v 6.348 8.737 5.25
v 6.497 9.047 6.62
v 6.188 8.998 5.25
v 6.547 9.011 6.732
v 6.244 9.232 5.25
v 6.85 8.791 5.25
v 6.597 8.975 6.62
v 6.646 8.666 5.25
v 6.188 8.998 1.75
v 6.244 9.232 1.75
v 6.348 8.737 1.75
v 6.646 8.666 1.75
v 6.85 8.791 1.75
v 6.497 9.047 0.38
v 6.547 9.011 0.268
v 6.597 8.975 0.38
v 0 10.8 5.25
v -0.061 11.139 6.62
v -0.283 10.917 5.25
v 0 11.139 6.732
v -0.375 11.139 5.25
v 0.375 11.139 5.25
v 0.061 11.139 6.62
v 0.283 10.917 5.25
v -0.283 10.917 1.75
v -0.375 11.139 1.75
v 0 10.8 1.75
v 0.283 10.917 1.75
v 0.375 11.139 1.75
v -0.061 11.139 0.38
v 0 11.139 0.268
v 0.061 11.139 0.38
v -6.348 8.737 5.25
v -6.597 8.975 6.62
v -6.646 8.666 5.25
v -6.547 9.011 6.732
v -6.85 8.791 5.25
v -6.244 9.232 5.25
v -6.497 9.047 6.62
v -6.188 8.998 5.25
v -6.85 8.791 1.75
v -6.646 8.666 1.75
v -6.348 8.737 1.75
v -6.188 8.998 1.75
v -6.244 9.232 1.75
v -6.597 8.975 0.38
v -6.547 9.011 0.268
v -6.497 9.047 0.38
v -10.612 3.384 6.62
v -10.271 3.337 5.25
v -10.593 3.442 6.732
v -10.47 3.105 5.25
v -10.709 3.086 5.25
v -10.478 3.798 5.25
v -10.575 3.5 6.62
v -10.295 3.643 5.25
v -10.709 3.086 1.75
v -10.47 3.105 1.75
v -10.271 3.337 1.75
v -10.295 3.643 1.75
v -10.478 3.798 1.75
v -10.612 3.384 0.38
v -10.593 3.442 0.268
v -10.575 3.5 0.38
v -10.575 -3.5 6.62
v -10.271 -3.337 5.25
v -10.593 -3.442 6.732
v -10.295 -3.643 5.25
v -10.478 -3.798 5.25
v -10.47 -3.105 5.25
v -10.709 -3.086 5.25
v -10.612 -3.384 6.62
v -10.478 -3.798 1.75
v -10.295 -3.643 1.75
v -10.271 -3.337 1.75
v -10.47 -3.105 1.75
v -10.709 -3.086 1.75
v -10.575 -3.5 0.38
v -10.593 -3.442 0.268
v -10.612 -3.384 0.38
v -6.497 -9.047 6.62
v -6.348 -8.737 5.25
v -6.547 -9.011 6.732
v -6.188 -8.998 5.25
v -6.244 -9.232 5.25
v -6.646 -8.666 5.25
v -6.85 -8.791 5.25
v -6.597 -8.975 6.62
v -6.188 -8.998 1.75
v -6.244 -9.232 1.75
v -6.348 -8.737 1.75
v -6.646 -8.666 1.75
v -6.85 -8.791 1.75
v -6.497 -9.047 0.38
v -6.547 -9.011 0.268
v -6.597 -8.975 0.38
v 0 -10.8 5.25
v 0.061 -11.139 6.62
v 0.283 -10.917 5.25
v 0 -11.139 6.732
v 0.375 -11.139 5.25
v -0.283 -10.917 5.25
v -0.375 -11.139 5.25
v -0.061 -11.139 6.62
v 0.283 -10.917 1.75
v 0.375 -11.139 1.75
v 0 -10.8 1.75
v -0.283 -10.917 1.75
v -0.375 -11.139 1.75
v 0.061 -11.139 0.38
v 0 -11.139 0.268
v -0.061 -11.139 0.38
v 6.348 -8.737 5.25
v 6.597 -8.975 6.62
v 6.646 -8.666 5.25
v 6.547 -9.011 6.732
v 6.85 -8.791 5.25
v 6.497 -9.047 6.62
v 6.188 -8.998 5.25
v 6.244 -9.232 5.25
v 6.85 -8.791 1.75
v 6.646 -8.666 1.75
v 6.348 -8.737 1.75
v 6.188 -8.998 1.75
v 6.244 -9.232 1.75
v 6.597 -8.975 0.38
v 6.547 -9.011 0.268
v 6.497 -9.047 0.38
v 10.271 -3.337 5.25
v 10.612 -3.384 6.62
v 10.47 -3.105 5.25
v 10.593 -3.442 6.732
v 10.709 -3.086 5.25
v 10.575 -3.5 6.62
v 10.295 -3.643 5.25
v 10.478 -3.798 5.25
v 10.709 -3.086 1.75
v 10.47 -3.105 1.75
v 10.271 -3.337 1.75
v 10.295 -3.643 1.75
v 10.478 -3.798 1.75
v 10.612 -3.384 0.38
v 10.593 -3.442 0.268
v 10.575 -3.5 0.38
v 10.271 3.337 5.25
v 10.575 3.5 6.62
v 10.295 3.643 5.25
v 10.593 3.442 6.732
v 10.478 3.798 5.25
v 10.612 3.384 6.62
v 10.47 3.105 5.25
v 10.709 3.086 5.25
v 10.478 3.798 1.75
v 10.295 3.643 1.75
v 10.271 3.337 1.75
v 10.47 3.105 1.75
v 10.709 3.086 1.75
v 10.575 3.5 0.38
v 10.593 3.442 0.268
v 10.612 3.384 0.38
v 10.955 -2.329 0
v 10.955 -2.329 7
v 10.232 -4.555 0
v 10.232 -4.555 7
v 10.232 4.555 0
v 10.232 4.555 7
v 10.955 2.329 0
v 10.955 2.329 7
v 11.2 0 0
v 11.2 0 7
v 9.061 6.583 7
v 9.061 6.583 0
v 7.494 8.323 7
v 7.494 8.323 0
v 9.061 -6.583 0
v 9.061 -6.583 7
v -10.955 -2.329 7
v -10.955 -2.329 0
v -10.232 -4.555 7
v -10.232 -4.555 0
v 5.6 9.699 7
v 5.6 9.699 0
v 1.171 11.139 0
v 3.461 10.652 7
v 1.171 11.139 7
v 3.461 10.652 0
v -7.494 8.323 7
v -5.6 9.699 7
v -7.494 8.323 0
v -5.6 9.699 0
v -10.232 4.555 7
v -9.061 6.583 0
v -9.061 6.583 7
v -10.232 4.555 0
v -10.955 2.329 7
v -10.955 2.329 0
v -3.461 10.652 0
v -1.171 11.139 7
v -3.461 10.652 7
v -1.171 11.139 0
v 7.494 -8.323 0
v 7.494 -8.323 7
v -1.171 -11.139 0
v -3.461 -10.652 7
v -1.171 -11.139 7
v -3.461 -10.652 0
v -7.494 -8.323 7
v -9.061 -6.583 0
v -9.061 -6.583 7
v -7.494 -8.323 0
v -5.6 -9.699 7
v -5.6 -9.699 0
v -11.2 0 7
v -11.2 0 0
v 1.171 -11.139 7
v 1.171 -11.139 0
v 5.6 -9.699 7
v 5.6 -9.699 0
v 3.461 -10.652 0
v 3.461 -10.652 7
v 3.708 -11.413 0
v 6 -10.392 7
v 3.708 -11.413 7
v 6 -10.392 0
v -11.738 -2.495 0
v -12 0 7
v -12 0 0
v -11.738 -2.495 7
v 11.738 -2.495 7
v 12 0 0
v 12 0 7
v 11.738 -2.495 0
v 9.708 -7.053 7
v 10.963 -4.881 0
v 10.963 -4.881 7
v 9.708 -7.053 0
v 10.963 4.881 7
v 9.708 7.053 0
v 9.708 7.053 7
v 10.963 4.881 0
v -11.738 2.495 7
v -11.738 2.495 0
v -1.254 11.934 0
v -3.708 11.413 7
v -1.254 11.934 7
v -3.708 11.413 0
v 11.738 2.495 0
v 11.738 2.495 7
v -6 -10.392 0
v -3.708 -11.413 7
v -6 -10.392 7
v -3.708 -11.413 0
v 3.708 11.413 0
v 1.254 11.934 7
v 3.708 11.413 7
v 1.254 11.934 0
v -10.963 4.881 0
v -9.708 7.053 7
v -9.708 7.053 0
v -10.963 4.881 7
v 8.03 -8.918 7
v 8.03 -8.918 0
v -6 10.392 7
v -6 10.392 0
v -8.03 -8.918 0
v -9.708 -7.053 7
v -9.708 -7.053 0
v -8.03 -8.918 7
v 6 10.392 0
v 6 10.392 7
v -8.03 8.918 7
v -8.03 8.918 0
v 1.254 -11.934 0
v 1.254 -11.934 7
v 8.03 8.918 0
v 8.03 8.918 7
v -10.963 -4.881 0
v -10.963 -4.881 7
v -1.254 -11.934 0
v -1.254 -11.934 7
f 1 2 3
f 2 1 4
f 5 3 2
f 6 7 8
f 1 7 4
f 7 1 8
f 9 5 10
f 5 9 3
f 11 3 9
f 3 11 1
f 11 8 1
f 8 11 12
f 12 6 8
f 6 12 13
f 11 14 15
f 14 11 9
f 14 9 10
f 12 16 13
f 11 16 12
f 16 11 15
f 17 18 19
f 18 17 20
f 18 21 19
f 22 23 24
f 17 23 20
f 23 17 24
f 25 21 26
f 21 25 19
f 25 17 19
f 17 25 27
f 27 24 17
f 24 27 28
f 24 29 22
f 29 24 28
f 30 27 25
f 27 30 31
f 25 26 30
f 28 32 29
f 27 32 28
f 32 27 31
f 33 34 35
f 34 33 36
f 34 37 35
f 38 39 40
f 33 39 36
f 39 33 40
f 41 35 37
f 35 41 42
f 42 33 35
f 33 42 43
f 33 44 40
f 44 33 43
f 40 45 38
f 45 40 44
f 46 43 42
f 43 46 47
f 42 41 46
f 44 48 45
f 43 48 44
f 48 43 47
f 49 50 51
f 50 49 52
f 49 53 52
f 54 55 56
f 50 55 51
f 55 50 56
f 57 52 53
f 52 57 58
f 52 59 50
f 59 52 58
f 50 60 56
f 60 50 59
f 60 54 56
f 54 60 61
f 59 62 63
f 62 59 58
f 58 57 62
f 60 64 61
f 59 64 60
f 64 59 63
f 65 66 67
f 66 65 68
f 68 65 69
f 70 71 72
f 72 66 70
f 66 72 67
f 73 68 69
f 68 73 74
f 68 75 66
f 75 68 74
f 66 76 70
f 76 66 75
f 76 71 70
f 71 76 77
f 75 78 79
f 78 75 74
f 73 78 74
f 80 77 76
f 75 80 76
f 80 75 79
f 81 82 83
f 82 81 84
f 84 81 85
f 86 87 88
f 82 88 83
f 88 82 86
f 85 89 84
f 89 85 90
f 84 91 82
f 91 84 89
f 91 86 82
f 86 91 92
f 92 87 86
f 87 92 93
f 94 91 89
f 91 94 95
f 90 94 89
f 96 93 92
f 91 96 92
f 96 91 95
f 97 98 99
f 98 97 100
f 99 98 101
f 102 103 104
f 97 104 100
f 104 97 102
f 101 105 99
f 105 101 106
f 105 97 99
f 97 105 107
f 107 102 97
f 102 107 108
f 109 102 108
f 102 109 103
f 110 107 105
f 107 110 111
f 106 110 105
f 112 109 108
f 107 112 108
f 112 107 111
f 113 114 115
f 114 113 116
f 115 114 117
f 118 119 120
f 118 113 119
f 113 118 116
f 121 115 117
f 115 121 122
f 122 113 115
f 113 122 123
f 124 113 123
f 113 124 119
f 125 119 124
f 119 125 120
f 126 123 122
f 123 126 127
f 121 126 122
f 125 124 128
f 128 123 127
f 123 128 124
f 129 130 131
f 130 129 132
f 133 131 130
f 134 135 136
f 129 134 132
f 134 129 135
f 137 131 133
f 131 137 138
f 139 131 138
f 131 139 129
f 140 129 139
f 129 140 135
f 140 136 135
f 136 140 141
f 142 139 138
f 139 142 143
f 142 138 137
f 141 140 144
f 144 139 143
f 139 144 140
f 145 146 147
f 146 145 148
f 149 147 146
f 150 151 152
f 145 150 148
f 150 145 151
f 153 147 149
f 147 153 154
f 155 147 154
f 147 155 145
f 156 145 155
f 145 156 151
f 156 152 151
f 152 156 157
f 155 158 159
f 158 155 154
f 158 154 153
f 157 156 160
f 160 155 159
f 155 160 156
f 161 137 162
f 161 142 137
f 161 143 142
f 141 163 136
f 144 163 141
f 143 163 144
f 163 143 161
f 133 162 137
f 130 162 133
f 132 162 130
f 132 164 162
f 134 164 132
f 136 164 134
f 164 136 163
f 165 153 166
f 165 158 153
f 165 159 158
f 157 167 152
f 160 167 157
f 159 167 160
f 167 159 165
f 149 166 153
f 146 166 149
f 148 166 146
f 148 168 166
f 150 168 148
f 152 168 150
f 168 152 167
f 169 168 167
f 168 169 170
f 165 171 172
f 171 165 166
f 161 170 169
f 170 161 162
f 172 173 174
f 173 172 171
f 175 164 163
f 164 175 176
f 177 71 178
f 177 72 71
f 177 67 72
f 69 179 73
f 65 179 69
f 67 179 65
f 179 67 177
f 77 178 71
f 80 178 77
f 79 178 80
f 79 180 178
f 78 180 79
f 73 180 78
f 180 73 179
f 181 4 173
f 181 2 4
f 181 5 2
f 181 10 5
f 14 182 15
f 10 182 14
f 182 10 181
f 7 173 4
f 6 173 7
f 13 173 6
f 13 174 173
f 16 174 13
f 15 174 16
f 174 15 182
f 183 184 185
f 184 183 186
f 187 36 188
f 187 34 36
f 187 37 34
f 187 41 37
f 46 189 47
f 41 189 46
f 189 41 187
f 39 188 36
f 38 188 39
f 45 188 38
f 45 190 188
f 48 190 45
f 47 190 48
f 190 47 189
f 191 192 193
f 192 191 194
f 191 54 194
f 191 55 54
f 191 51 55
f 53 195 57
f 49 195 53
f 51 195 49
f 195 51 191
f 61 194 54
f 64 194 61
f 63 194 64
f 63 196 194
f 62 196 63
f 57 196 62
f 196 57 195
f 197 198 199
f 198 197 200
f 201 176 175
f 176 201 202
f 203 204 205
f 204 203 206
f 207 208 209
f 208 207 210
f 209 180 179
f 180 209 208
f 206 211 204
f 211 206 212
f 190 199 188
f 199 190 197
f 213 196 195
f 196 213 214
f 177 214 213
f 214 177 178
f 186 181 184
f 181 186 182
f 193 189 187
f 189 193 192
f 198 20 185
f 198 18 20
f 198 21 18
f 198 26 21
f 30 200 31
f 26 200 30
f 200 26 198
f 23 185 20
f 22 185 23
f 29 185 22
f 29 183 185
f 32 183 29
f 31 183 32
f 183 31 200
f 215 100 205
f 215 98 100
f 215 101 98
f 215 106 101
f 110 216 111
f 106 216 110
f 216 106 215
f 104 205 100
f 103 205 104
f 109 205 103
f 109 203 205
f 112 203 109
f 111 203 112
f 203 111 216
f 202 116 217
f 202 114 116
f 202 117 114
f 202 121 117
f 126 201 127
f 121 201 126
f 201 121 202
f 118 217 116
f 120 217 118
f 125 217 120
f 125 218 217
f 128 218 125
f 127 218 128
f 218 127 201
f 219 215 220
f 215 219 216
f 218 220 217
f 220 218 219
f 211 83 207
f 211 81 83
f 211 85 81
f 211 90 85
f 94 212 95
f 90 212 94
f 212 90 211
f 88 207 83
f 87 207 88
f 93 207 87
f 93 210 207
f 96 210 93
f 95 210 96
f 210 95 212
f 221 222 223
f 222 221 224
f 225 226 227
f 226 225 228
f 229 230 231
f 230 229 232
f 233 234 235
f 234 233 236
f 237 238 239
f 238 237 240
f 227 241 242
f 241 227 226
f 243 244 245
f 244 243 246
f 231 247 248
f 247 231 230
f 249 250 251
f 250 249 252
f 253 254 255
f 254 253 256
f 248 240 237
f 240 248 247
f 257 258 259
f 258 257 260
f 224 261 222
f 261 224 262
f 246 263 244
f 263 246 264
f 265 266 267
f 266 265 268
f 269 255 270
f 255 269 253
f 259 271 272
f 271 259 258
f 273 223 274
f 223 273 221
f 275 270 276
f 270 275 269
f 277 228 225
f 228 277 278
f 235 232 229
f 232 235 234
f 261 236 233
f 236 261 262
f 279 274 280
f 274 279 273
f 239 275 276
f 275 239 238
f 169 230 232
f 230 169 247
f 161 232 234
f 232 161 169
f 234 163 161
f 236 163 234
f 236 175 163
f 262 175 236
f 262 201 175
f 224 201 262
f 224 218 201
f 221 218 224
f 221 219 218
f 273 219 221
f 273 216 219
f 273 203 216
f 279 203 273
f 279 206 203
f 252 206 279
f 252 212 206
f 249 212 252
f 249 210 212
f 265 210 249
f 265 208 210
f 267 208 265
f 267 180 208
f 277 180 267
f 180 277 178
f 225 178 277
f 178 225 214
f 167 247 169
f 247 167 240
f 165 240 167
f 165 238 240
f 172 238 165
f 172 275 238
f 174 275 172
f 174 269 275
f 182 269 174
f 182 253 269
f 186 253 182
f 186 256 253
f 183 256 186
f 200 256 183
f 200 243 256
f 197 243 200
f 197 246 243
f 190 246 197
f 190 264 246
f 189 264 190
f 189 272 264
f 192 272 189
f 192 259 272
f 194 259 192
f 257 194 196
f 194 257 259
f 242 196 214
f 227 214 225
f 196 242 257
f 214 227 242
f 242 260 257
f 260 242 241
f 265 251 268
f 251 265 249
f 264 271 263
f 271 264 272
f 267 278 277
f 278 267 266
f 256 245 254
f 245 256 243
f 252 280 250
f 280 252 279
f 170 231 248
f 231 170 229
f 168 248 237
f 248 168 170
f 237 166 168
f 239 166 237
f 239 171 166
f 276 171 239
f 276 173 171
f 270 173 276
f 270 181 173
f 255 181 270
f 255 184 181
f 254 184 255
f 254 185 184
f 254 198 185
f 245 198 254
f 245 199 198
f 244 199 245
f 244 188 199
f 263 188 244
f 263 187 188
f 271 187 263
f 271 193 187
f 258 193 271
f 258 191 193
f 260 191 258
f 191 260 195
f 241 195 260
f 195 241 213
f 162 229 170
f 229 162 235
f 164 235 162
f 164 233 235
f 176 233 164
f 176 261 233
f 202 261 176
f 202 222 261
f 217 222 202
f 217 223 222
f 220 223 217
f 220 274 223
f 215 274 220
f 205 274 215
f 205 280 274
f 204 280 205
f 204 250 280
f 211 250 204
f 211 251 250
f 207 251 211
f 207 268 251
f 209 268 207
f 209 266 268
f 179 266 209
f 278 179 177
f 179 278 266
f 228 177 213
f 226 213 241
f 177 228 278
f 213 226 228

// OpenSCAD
// file: bearing_race_spline.scad
bearing_race_spline();

module bearing_race_spline(
    h = 10, 
    r = 1,
    taper = 2.5)
{
    cylinder_height = h - (taper * 2);
    
    translate([0,0,taper + cylinder_height])
    cylinder(h = taper, r1 = r, r2 = 0);
    
    translate([0,0,taper])
    cylinder(h = cylinder_height, r = r);
    
    cylinder(h = taper, r1 = 0, r2 = r);
}
// file: bearing_race_hole.scad
use <bearing_race_spline.scad>;
include <bearing_race_hole.settings.scad>;
include <bearing.table.scad>;

bearing_race_hole();

module bearing_race_hole(
    index = "608",
    clearance = undef,
    h = undef,
    spline_qty = undef,
    spline_depth = undef,
    extra_margin_bottom = undef,
    extra_margin_top = undef)
{
    function _clearance() = (clearance != undef) ? clearance : default_clearance;
    function _h() = (h != undef) ? h : bearing_height(index);
    function _spline_qty() = (spline_qty != undef) ? spline_qty : default_spline_qty;
    function _spline_depth() = (spline_depth != undef) ? spline_depth : default_spline_depth;
    function _extra_margin_bottom() = (extra_margin_bottom != undef) ? extra_margin_bottom : default_extra_margin_bottom;
    function _extra_margin_top() = (extra_margin_top != undef) ? extra_margin_top : default_extra_margin_top;

    r = (bearing_outer_diameter(index) / 2) + _clearance();

    difference()
    {
        extra_margin_bottom = _extra_margin_bottom();
        extra_margin_top = _extra_margin_top();
        spline_qty = _spline_qty();
        h = _h() + extra_margin_bottom + extra_margin_top;

        translate([0, 0, -extra_margin_bottom])
        cylinder(h = h, r = r);
        
        rotate([0, 0, 360 / spline_qty / 2])
        splines();
    }
    
    module splines()
    {
        h = _h();
        spline_qty = _spline_qty();
        spline_depth = _spline_depth();

        for (i = [1:spline_qty])
        {
            angle = i * (360 / spline_qty);
            rotate([0, 0, angle])
            translate([r, 0, 0])
            bearing_race_spline(
                h = h, 
                r = spline_depth, 
                taper = h / 4, 
                $fn = 8);
        }        
    }
}
// file: bearing_race_hole.settings.scad
default_clearance = 0.2;
default_spline_qty = 10;
default_spline_depth = 0.4;
default_extra_margin_top = 10;
default_extra_margin_bottom = 10;
// file: bearing.table.scad
function bearing_outer_diameter(index) = bearing_data(index)[0];
function bearing_inner_diameter(index) = bearing_data(index)[1];
function bearing_height(index) = bearing_data(index)[2];
function bearing_ball_qty(index) = bearing_data(index)[3];

function bearing_data(index) = 
    // od, id, h, ball_qty
    index == "608"  ? [22, 8, 7, 7] :
    "Error";
// main file
include <bearing.table.scad>;
include <bearing_race_hole.settings.scad>;
use <bearing_race_hole.scad>;

bearing_race();

module bearing_race(
    index = "608",
    h = undef, 
    od = undef,
    clearance = undef,
    spline_qty = undef,
    spline_depth = undef)
{
    function _od() = (od != undef) ? od : bearing_outer_diameter(index) + 2;
    function _h() = (h != undef) ? h : bearing_height(index);

    difference()
    {
        h = _h();
        r = _od() / 2;

        cylinder(
            h = h, 
            r = r);
        
        bearing_race_hole(
            index = index,
            clearance = clearance,
            h = h,
            spline_qty = spline_qty,
            spline_depth = spline_depth
        );
    }    
}
